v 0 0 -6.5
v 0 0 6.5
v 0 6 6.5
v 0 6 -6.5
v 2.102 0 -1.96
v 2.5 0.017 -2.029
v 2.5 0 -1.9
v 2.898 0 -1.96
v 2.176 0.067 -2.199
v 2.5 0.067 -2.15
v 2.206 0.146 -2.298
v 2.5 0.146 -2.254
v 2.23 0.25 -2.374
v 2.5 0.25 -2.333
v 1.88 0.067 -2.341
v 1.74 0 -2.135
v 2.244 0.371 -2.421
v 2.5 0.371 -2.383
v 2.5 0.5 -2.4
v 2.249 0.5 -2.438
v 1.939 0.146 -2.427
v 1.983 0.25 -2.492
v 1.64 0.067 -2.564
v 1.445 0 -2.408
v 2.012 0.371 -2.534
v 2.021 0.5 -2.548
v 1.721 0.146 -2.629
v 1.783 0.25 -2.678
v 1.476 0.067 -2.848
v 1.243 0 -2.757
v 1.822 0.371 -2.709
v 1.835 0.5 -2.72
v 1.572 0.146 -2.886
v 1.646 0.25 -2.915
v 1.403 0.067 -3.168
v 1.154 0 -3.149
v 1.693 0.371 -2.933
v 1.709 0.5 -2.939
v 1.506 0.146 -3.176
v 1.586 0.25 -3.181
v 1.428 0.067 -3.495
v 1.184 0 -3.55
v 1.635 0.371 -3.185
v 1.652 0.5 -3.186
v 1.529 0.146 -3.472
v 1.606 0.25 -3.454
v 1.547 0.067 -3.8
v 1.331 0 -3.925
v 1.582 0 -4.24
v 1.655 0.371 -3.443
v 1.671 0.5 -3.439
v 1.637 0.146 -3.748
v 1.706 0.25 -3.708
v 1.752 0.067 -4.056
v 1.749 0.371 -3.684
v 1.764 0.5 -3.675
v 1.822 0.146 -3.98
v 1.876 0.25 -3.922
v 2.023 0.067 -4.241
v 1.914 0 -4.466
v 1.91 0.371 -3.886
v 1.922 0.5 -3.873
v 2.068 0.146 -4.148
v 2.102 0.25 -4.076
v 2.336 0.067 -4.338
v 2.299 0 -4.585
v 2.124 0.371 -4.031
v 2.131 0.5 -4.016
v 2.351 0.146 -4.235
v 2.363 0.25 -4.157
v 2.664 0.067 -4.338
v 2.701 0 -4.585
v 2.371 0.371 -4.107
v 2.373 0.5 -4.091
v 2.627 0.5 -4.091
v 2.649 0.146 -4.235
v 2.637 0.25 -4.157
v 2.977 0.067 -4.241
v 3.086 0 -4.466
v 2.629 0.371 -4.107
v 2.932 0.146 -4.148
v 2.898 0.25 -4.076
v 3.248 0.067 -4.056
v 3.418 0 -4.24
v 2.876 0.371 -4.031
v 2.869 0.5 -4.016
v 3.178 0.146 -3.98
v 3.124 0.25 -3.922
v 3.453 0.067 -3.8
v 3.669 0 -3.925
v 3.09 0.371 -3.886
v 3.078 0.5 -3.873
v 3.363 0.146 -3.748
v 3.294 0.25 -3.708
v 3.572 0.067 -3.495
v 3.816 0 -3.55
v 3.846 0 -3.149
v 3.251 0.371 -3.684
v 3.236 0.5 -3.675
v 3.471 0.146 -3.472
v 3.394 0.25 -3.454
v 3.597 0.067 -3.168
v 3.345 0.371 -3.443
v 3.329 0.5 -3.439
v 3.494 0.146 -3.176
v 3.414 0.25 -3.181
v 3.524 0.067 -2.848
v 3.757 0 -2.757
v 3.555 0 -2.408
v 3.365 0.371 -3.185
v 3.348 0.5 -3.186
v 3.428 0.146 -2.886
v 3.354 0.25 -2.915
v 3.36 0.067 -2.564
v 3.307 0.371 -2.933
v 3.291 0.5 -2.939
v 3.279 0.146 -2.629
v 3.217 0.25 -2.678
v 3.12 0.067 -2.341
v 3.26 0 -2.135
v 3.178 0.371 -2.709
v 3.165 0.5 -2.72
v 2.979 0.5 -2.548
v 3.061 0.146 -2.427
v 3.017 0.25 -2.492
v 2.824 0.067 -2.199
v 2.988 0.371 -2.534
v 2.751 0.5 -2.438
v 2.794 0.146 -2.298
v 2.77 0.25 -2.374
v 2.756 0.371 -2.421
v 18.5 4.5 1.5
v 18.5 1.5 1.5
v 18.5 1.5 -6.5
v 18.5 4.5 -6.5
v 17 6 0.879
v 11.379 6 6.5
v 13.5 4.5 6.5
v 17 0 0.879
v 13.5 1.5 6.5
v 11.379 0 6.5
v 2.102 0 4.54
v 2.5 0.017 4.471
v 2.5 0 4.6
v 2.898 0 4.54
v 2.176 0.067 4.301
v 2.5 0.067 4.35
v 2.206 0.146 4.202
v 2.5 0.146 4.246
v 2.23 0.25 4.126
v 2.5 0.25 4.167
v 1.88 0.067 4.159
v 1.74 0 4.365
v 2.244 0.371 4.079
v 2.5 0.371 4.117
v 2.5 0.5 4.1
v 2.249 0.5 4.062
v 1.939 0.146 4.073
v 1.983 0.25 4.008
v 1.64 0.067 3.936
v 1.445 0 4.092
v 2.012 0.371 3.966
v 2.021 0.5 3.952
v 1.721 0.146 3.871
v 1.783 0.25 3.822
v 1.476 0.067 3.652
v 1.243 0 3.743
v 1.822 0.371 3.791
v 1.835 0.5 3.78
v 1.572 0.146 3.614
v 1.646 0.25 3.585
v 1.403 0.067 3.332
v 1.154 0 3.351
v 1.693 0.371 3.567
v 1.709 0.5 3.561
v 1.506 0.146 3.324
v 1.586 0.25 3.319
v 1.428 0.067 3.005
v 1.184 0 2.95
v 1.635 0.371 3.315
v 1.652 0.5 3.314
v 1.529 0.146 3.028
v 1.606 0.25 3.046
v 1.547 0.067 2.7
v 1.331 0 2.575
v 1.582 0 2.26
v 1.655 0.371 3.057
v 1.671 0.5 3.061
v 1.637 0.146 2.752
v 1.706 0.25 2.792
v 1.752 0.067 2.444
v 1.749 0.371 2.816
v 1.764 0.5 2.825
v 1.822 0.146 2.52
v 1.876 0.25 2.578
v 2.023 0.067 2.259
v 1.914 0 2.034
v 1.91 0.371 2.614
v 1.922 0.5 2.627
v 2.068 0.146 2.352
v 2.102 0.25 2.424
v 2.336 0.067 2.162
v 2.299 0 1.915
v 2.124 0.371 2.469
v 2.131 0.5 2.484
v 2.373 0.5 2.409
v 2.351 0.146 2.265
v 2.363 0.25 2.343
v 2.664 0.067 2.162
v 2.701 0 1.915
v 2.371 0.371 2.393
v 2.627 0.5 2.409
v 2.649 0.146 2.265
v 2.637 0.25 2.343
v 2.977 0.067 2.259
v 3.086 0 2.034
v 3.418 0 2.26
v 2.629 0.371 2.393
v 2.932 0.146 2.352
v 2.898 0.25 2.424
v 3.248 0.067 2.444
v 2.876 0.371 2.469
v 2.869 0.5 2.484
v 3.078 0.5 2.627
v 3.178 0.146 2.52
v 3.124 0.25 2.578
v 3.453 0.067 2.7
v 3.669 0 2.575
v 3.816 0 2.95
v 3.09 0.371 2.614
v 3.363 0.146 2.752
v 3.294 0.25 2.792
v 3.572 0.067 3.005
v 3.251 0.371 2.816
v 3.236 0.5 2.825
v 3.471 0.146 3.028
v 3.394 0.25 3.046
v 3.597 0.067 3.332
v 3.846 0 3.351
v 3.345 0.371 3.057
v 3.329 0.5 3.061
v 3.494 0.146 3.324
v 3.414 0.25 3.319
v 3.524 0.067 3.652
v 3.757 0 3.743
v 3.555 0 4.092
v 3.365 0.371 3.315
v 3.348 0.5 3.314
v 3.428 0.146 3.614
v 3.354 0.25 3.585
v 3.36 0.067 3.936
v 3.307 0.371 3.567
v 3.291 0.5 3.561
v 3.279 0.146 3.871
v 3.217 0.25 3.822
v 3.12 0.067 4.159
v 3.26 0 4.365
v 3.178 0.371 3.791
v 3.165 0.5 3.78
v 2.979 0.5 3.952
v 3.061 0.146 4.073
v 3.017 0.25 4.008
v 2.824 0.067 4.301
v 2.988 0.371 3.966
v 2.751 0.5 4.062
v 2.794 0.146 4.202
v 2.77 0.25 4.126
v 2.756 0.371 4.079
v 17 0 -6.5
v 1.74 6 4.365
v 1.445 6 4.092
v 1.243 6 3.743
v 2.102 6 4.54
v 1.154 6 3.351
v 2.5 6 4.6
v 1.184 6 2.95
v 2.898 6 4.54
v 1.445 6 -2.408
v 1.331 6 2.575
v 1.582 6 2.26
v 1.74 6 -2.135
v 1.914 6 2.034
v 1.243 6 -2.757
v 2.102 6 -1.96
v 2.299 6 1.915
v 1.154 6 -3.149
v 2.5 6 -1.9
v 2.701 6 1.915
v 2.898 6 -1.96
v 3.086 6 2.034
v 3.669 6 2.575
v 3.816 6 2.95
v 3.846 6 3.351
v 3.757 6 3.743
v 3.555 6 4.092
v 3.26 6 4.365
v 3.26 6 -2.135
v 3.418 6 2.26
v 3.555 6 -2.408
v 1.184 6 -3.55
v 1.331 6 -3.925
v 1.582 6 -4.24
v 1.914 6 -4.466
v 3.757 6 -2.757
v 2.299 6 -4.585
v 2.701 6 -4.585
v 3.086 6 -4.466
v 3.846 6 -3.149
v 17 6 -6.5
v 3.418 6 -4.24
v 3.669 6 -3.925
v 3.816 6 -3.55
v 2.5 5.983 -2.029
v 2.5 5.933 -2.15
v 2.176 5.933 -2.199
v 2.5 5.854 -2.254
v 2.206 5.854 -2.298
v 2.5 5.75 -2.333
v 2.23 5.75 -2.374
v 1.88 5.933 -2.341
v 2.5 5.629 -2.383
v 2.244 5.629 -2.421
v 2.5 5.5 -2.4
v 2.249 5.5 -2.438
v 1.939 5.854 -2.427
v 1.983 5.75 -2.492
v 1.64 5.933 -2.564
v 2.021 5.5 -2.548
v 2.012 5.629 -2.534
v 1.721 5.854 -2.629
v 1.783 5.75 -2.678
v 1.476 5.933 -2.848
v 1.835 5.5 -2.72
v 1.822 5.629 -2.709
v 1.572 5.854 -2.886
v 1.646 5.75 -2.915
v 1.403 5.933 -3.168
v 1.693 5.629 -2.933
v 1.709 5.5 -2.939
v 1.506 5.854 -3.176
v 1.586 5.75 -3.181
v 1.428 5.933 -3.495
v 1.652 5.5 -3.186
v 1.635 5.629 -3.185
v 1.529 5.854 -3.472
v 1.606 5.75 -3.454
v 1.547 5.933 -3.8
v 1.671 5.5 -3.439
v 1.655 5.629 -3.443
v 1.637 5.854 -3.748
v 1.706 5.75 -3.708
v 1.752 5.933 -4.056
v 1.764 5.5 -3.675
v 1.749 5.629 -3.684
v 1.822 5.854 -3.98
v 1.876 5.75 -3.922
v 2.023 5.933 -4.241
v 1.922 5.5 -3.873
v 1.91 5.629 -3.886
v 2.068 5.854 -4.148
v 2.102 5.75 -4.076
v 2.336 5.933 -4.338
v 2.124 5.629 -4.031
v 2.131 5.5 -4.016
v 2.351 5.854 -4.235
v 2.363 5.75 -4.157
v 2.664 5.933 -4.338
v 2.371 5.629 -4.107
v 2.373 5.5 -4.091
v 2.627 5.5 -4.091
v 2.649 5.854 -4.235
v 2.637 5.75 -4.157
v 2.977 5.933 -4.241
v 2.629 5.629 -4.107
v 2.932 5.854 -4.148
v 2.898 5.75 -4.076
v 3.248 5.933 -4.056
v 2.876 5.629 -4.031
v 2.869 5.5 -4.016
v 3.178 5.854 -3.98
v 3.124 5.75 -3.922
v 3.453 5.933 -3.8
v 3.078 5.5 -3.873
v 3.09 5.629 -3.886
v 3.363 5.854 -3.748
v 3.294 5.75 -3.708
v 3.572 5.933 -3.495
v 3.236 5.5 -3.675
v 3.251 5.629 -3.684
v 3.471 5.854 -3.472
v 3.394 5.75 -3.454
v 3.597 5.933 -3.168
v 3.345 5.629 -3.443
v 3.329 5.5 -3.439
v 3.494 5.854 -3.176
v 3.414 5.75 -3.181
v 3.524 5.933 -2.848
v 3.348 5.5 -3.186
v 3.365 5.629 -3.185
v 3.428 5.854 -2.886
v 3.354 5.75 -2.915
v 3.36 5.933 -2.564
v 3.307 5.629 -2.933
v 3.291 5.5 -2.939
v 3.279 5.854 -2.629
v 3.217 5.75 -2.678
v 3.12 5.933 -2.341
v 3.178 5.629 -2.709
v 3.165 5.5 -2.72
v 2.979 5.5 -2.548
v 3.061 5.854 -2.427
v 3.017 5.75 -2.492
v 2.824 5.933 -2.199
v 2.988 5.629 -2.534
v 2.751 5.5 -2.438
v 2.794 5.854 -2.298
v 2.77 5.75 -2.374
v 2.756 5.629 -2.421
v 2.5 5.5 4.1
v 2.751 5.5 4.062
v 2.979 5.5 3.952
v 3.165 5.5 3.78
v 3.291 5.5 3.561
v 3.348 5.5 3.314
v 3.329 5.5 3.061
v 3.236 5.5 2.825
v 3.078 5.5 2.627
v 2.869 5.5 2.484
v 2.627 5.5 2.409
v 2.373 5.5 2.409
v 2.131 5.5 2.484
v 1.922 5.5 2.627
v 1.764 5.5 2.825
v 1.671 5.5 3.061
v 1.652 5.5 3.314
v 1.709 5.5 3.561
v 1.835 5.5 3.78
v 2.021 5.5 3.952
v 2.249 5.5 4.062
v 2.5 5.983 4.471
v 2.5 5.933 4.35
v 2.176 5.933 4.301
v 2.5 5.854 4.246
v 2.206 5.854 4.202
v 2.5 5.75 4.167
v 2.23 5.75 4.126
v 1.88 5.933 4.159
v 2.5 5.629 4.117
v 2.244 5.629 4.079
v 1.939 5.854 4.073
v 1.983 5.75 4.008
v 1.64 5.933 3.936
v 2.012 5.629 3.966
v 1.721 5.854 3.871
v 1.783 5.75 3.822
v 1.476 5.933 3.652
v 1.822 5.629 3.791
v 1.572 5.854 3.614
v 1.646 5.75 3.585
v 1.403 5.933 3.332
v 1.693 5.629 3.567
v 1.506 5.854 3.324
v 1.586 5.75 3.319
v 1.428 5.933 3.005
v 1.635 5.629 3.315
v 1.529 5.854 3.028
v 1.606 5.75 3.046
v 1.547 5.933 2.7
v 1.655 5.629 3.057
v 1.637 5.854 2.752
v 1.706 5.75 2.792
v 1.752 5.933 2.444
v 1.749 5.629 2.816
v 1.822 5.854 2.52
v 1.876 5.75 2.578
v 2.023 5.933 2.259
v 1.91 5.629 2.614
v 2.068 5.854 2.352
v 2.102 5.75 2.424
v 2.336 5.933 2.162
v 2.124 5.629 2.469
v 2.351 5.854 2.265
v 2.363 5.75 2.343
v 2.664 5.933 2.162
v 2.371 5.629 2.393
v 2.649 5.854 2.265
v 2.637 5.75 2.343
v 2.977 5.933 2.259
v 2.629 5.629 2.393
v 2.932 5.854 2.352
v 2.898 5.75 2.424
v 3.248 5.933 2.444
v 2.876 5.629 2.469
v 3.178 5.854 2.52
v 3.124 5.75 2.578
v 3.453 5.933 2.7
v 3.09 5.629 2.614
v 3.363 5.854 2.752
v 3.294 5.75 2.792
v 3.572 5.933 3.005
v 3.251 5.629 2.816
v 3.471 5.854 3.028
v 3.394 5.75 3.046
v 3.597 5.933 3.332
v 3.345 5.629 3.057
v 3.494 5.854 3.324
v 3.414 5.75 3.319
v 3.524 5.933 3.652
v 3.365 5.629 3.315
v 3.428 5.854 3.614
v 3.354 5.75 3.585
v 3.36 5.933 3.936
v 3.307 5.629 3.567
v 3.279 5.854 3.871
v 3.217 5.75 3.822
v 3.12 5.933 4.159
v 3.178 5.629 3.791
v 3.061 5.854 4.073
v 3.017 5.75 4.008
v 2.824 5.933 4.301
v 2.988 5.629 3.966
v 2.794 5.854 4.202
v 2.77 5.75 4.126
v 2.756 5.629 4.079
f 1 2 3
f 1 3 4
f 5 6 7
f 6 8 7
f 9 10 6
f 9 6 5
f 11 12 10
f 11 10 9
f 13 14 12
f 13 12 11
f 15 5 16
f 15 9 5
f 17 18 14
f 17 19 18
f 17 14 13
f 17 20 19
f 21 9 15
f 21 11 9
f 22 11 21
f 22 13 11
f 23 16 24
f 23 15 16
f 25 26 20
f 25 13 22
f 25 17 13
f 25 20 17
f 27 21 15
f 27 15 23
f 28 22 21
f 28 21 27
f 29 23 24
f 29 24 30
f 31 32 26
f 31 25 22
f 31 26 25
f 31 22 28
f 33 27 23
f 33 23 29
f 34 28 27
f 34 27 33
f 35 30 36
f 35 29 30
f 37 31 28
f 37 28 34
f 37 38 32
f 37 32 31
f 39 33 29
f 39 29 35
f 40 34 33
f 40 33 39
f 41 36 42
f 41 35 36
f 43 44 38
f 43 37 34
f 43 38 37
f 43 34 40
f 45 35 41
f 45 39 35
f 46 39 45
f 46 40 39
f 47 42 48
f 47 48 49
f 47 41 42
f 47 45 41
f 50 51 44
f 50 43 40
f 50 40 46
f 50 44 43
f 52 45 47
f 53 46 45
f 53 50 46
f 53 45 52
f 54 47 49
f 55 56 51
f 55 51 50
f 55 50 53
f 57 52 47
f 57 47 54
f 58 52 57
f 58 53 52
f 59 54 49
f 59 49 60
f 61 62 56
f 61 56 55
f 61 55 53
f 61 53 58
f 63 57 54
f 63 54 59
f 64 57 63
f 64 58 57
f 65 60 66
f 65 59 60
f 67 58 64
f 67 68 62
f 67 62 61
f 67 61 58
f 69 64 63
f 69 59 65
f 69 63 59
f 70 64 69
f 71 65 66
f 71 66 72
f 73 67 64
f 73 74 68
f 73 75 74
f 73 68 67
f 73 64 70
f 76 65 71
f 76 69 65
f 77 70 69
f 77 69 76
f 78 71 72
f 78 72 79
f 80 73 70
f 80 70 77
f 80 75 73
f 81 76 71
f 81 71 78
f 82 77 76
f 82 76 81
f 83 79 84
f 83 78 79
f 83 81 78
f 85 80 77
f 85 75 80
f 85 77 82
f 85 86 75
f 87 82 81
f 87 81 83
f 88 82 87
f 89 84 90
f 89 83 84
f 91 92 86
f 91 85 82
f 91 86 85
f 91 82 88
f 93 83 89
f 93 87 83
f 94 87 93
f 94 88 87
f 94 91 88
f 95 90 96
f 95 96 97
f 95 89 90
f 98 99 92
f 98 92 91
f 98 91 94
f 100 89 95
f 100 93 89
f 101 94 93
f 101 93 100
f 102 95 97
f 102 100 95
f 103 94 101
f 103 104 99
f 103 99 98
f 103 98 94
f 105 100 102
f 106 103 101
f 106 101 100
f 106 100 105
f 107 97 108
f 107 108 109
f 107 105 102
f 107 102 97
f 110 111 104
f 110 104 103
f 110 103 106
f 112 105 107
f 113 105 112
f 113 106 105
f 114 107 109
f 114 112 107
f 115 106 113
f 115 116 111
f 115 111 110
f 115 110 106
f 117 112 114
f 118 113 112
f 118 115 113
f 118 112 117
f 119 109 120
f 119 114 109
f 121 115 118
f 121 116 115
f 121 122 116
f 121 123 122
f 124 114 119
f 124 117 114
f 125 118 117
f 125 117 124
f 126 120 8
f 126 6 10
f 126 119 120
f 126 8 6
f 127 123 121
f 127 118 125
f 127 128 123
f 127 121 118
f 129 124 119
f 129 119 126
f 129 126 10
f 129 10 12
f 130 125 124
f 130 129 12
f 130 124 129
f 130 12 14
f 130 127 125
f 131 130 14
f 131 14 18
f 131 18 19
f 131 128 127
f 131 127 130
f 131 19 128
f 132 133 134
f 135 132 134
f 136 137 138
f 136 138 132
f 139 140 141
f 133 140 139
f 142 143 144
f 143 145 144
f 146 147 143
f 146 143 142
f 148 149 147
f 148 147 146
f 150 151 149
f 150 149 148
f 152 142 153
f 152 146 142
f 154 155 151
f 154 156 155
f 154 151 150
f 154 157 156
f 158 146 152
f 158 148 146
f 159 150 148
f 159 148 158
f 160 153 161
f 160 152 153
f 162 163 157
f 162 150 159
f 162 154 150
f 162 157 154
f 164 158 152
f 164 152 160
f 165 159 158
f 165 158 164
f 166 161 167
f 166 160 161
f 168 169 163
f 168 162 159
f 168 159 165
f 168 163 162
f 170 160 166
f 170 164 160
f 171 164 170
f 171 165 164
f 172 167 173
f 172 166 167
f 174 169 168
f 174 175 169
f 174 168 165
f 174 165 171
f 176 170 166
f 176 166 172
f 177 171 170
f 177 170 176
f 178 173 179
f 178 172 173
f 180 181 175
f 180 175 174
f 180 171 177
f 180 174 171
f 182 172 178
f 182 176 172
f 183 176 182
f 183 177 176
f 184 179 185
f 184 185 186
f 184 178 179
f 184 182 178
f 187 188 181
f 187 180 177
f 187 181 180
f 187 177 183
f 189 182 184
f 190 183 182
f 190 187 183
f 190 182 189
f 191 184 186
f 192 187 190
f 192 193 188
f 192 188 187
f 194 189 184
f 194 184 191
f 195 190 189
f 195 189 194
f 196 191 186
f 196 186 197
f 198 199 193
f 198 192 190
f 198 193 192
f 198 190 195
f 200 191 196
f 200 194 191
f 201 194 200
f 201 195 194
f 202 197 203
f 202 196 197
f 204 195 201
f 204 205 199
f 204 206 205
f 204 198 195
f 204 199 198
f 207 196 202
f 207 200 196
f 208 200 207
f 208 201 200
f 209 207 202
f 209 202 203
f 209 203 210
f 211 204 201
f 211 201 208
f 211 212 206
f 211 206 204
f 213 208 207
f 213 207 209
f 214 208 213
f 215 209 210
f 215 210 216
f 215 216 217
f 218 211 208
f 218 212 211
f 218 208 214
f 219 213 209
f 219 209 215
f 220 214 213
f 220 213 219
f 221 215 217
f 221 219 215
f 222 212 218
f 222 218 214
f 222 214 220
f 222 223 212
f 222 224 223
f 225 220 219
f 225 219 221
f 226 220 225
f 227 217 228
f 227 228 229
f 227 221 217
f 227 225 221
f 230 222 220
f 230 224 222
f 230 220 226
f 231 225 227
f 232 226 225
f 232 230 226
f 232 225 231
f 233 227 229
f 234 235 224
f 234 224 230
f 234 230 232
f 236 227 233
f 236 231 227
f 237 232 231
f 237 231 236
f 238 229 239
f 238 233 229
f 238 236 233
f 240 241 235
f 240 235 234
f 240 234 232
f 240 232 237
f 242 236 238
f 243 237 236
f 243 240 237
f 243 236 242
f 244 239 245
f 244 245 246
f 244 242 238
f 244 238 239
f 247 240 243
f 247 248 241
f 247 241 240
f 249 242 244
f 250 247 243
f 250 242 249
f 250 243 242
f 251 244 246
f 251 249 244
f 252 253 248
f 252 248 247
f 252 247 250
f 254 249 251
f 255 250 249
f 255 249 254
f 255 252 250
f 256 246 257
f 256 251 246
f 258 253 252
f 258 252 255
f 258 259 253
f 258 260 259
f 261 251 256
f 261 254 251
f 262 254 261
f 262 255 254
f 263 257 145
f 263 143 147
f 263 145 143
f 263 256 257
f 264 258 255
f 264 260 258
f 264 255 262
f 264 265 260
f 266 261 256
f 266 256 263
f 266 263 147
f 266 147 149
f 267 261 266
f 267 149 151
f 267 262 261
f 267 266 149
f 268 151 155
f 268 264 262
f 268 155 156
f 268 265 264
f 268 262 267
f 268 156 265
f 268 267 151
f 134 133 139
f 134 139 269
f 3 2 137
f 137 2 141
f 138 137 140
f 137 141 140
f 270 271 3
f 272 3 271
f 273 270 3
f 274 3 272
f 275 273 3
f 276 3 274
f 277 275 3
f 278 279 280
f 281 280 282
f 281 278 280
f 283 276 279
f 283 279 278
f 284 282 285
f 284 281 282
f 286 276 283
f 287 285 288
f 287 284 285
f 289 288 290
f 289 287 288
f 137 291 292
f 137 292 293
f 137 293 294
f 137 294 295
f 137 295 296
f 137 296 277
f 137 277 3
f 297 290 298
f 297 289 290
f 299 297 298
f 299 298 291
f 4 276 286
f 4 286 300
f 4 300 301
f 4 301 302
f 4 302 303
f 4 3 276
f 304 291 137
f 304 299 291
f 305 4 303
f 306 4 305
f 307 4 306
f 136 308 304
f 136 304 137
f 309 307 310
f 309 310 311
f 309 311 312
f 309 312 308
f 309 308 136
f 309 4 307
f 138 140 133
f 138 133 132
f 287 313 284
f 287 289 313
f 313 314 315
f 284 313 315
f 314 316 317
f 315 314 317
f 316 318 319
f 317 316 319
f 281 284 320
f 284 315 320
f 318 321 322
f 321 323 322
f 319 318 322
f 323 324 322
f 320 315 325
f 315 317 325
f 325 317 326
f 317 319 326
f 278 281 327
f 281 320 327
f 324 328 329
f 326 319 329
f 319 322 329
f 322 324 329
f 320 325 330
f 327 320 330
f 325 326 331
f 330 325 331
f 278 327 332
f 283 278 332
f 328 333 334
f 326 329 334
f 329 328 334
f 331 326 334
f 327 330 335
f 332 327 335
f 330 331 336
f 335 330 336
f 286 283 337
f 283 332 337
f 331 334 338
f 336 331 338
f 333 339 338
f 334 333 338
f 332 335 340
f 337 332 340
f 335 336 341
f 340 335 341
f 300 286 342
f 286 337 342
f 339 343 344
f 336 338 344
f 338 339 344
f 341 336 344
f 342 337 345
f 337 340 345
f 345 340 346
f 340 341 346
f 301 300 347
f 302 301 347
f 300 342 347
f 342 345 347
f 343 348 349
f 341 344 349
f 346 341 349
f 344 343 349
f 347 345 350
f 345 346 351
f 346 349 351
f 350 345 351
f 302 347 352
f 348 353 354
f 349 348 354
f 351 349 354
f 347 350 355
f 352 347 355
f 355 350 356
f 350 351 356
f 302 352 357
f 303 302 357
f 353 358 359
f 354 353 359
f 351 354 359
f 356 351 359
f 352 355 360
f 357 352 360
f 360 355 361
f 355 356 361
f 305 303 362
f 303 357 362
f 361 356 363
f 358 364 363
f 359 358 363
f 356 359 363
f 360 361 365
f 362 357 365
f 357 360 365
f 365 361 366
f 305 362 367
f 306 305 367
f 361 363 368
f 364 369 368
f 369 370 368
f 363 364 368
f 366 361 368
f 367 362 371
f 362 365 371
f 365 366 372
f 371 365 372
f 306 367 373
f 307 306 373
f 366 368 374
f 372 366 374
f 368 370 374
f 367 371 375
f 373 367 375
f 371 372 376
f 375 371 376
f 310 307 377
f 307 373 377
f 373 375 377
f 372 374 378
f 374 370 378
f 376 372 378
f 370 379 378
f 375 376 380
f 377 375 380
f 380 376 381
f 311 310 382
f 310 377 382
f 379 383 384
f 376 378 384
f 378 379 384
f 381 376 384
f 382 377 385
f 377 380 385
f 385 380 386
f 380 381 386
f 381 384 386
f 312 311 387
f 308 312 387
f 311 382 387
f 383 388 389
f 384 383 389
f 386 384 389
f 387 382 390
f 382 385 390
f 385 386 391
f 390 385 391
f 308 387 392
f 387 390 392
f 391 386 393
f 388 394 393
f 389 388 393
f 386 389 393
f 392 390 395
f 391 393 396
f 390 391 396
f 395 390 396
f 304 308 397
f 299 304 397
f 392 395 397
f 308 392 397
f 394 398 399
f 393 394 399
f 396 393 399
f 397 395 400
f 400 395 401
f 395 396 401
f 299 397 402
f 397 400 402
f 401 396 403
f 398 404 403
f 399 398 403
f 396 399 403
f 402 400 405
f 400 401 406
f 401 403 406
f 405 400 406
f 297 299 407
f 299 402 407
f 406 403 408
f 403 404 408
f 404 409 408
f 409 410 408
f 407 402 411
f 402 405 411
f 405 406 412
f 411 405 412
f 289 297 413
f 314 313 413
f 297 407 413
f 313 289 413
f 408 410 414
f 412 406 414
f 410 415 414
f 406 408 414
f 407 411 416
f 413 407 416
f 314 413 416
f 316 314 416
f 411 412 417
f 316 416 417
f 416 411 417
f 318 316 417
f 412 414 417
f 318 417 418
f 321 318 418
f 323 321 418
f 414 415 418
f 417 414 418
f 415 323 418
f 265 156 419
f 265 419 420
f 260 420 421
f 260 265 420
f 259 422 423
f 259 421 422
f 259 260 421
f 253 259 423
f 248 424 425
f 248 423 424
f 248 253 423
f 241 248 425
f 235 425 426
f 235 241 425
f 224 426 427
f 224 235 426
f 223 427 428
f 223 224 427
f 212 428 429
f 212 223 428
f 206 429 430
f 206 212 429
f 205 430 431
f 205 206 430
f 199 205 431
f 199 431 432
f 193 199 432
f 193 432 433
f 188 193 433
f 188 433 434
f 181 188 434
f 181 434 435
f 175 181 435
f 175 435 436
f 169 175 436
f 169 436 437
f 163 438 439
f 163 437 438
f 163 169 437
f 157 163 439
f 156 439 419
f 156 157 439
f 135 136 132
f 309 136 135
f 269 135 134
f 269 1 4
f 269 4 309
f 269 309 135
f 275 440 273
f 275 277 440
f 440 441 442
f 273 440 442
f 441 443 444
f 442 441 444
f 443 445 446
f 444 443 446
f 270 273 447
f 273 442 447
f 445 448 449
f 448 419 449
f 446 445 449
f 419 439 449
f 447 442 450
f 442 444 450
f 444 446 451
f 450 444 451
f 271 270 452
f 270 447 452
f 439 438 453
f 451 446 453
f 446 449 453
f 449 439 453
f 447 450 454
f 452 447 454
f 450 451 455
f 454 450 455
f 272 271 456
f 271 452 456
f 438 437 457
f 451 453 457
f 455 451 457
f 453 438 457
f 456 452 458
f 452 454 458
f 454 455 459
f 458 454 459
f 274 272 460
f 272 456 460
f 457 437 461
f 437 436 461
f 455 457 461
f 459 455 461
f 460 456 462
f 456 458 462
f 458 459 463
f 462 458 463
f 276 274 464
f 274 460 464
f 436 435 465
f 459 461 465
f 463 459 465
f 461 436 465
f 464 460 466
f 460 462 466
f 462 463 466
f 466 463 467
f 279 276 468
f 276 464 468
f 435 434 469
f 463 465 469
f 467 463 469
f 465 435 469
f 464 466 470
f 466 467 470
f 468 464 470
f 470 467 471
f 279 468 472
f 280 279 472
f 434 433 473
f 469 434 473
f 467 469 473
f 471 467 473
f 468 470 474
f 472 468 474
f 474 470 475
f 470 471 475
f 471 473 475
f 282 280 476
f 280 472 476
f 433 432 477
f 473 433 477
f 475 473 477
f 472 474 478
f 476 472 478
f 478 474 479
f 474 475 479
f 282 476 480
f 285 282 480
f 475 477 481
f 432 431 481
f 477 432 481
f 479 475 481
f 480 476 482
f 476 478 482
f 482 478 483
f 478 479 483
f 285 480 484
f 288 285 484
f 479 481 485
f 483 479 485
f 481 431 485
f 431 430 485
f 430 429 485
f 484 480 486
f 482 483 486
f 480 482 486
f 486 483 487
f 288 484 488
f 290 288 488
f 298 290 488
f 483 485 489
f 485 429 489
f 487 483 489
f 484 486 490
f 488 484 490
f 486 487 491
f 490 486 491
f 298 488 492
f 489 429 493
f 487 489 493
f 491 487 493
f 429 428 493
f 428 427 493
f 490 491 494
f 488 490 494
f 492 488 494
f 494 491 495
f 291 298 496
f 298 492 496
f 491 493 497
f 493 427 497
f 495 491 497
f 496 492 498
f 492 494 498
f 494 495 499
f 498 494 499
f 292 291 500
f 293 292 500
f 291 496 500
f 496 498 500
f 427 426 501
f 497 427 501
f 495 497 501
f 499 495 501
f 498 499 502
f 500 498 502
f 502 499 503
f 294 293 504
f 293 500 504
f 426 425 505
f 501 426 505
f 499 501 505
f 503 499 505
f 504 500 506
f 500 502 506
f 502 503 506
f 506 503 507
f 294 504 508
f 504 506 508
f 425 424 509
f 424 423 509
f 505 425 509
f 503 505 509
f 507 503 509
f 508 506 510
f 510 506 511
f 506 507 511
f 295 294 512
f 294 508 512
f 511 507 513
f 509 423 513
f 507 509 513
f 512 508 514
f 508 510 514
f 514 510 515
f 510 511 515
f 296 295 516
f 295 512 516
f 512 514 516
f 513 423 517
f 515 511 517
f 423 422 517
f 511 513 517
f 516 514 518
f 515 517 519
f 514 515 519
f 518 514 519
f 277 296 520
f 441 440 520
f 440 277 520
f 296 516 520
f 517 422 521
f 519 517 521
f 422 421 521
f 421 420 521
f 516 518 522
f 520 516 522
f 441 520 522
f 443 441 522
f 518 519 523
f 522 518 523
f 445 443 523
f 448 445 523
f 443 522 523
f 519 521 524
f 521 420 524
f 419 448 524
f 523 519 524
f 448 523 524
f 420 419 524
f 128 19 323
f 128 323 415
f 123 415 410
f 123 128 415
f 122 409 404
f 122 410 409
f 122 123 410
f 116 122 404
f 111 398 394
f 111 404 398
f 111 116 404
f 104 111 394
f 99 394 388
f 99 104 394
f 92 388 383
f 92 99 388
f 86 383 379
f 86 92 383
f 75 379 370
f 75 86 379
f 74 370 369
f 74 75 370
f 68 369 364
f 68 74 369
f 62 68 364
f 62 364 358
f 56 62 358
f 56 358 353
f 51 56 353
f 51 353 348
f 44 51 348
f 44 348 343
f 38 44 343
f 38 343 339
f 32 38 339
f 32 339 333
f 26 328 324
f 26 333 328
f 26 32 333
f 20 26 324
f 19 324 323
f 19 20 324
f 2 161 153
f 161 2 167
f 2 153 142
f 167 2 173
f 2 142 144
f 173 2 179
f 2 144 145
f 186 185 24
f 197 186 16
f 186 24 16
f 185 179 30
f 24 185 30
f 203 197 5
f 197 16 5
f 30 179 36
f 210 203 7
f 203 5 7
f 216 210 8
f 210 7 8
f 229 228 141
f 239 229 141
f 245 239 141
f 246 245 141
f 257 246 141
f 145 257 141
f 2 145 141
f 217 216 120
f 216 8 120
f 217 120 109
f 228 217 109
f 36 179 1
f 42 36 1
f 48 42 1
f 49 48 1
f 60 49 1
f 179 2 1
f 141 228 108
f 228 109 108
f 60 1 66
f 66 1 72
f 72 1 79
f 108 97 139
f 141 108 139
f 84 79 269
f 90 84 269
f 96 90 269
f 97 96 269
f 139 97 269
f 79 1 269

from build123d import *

# Parameters (mm, degrees)
SKETCH1_W               = 18.5
SKETCH1_H               = 13
BOSS_EXTRUDE1_DEPTH     = 6
CUT_EXTRUDE1_DEPTH      = 21.506096654
CUT_EXTRUDE1_DEPTH_BACK = 21.506096654
SKETCH2_R               = 0.85
FILLET1_R               = 0.5
CHAMFER1_SIZE           = 5
CHAMFER2_SIZE           = 1.5


with BuildPart() as part:
    # Sketch1 → Boss-Extrude1 (new body)
    with BuildSketch(Plane(origin=(0, 0, 0), x_dir=(1, 0, 0), z_dir=(0, 1, 0))):
        with Locations((9.25, 0)):
            Rectangle(SKETCH1_W, SKETCH1_H)
    extrude(amount=BOSS_EXTRUDE1_DEPTH)

    # Sketch2 → Cut-Extrude1 (cut, two sides: drawn at the far end of the back side and taken through both)
    with BuildSketch(Plane(origin=(0, 6, 0), x_dir=(1, 0, 0), z_dir=(0, 1, 0)).offset(-CUT_EXTRUDE1_DEPTH_BACK)):
        with Locations(Location((2.5, 3.25, 0), (0, 0, 270))):
            Circle(SKETCH2_R)
        with Locations(Location((2.5, -3.25, 0), (0, 0, 270))):
            Circle(SKETCH2_R)
    extrude(amount=CUT_EXTRUDE1_DEPTH + CUT_EXTRUDE1_DEPTH_BACK, mode=Mode.SUBTRACT)

    # Fillet1
    fillet1_edges = [part.edges().sort_by_distance(p)[0] for p in [
        (2.5, 0, -4.1),
        (2.5, 6, -4.1),
        (2.5, 0, 2.4),
        (2.5, 6, 2.4),
    ]]
    fillet(fillet1_edges, radius=FILLET1_R)

    # Chamfer1
    chamfer1_edges = [part.edges().sort_by_distance(p)[0] for p in [
        (18.5, 3, 6.5),
    ]]
    chamfer(chamfer1_edges, length=CHAMFER1_SIZE)

    # Chamfer2
    chamfer2_edges = [part.edges().sort_by_distance(p)[0] for p in [
        (18.5, 0, -2.5),
        (18.5, 6, -2.5),
        (16, 0, 4),
        (16, 6, 4),
    ]]
    chamfer(chamfer2_edges, length=CHAMFER2_SIZE)


solid = part.part
